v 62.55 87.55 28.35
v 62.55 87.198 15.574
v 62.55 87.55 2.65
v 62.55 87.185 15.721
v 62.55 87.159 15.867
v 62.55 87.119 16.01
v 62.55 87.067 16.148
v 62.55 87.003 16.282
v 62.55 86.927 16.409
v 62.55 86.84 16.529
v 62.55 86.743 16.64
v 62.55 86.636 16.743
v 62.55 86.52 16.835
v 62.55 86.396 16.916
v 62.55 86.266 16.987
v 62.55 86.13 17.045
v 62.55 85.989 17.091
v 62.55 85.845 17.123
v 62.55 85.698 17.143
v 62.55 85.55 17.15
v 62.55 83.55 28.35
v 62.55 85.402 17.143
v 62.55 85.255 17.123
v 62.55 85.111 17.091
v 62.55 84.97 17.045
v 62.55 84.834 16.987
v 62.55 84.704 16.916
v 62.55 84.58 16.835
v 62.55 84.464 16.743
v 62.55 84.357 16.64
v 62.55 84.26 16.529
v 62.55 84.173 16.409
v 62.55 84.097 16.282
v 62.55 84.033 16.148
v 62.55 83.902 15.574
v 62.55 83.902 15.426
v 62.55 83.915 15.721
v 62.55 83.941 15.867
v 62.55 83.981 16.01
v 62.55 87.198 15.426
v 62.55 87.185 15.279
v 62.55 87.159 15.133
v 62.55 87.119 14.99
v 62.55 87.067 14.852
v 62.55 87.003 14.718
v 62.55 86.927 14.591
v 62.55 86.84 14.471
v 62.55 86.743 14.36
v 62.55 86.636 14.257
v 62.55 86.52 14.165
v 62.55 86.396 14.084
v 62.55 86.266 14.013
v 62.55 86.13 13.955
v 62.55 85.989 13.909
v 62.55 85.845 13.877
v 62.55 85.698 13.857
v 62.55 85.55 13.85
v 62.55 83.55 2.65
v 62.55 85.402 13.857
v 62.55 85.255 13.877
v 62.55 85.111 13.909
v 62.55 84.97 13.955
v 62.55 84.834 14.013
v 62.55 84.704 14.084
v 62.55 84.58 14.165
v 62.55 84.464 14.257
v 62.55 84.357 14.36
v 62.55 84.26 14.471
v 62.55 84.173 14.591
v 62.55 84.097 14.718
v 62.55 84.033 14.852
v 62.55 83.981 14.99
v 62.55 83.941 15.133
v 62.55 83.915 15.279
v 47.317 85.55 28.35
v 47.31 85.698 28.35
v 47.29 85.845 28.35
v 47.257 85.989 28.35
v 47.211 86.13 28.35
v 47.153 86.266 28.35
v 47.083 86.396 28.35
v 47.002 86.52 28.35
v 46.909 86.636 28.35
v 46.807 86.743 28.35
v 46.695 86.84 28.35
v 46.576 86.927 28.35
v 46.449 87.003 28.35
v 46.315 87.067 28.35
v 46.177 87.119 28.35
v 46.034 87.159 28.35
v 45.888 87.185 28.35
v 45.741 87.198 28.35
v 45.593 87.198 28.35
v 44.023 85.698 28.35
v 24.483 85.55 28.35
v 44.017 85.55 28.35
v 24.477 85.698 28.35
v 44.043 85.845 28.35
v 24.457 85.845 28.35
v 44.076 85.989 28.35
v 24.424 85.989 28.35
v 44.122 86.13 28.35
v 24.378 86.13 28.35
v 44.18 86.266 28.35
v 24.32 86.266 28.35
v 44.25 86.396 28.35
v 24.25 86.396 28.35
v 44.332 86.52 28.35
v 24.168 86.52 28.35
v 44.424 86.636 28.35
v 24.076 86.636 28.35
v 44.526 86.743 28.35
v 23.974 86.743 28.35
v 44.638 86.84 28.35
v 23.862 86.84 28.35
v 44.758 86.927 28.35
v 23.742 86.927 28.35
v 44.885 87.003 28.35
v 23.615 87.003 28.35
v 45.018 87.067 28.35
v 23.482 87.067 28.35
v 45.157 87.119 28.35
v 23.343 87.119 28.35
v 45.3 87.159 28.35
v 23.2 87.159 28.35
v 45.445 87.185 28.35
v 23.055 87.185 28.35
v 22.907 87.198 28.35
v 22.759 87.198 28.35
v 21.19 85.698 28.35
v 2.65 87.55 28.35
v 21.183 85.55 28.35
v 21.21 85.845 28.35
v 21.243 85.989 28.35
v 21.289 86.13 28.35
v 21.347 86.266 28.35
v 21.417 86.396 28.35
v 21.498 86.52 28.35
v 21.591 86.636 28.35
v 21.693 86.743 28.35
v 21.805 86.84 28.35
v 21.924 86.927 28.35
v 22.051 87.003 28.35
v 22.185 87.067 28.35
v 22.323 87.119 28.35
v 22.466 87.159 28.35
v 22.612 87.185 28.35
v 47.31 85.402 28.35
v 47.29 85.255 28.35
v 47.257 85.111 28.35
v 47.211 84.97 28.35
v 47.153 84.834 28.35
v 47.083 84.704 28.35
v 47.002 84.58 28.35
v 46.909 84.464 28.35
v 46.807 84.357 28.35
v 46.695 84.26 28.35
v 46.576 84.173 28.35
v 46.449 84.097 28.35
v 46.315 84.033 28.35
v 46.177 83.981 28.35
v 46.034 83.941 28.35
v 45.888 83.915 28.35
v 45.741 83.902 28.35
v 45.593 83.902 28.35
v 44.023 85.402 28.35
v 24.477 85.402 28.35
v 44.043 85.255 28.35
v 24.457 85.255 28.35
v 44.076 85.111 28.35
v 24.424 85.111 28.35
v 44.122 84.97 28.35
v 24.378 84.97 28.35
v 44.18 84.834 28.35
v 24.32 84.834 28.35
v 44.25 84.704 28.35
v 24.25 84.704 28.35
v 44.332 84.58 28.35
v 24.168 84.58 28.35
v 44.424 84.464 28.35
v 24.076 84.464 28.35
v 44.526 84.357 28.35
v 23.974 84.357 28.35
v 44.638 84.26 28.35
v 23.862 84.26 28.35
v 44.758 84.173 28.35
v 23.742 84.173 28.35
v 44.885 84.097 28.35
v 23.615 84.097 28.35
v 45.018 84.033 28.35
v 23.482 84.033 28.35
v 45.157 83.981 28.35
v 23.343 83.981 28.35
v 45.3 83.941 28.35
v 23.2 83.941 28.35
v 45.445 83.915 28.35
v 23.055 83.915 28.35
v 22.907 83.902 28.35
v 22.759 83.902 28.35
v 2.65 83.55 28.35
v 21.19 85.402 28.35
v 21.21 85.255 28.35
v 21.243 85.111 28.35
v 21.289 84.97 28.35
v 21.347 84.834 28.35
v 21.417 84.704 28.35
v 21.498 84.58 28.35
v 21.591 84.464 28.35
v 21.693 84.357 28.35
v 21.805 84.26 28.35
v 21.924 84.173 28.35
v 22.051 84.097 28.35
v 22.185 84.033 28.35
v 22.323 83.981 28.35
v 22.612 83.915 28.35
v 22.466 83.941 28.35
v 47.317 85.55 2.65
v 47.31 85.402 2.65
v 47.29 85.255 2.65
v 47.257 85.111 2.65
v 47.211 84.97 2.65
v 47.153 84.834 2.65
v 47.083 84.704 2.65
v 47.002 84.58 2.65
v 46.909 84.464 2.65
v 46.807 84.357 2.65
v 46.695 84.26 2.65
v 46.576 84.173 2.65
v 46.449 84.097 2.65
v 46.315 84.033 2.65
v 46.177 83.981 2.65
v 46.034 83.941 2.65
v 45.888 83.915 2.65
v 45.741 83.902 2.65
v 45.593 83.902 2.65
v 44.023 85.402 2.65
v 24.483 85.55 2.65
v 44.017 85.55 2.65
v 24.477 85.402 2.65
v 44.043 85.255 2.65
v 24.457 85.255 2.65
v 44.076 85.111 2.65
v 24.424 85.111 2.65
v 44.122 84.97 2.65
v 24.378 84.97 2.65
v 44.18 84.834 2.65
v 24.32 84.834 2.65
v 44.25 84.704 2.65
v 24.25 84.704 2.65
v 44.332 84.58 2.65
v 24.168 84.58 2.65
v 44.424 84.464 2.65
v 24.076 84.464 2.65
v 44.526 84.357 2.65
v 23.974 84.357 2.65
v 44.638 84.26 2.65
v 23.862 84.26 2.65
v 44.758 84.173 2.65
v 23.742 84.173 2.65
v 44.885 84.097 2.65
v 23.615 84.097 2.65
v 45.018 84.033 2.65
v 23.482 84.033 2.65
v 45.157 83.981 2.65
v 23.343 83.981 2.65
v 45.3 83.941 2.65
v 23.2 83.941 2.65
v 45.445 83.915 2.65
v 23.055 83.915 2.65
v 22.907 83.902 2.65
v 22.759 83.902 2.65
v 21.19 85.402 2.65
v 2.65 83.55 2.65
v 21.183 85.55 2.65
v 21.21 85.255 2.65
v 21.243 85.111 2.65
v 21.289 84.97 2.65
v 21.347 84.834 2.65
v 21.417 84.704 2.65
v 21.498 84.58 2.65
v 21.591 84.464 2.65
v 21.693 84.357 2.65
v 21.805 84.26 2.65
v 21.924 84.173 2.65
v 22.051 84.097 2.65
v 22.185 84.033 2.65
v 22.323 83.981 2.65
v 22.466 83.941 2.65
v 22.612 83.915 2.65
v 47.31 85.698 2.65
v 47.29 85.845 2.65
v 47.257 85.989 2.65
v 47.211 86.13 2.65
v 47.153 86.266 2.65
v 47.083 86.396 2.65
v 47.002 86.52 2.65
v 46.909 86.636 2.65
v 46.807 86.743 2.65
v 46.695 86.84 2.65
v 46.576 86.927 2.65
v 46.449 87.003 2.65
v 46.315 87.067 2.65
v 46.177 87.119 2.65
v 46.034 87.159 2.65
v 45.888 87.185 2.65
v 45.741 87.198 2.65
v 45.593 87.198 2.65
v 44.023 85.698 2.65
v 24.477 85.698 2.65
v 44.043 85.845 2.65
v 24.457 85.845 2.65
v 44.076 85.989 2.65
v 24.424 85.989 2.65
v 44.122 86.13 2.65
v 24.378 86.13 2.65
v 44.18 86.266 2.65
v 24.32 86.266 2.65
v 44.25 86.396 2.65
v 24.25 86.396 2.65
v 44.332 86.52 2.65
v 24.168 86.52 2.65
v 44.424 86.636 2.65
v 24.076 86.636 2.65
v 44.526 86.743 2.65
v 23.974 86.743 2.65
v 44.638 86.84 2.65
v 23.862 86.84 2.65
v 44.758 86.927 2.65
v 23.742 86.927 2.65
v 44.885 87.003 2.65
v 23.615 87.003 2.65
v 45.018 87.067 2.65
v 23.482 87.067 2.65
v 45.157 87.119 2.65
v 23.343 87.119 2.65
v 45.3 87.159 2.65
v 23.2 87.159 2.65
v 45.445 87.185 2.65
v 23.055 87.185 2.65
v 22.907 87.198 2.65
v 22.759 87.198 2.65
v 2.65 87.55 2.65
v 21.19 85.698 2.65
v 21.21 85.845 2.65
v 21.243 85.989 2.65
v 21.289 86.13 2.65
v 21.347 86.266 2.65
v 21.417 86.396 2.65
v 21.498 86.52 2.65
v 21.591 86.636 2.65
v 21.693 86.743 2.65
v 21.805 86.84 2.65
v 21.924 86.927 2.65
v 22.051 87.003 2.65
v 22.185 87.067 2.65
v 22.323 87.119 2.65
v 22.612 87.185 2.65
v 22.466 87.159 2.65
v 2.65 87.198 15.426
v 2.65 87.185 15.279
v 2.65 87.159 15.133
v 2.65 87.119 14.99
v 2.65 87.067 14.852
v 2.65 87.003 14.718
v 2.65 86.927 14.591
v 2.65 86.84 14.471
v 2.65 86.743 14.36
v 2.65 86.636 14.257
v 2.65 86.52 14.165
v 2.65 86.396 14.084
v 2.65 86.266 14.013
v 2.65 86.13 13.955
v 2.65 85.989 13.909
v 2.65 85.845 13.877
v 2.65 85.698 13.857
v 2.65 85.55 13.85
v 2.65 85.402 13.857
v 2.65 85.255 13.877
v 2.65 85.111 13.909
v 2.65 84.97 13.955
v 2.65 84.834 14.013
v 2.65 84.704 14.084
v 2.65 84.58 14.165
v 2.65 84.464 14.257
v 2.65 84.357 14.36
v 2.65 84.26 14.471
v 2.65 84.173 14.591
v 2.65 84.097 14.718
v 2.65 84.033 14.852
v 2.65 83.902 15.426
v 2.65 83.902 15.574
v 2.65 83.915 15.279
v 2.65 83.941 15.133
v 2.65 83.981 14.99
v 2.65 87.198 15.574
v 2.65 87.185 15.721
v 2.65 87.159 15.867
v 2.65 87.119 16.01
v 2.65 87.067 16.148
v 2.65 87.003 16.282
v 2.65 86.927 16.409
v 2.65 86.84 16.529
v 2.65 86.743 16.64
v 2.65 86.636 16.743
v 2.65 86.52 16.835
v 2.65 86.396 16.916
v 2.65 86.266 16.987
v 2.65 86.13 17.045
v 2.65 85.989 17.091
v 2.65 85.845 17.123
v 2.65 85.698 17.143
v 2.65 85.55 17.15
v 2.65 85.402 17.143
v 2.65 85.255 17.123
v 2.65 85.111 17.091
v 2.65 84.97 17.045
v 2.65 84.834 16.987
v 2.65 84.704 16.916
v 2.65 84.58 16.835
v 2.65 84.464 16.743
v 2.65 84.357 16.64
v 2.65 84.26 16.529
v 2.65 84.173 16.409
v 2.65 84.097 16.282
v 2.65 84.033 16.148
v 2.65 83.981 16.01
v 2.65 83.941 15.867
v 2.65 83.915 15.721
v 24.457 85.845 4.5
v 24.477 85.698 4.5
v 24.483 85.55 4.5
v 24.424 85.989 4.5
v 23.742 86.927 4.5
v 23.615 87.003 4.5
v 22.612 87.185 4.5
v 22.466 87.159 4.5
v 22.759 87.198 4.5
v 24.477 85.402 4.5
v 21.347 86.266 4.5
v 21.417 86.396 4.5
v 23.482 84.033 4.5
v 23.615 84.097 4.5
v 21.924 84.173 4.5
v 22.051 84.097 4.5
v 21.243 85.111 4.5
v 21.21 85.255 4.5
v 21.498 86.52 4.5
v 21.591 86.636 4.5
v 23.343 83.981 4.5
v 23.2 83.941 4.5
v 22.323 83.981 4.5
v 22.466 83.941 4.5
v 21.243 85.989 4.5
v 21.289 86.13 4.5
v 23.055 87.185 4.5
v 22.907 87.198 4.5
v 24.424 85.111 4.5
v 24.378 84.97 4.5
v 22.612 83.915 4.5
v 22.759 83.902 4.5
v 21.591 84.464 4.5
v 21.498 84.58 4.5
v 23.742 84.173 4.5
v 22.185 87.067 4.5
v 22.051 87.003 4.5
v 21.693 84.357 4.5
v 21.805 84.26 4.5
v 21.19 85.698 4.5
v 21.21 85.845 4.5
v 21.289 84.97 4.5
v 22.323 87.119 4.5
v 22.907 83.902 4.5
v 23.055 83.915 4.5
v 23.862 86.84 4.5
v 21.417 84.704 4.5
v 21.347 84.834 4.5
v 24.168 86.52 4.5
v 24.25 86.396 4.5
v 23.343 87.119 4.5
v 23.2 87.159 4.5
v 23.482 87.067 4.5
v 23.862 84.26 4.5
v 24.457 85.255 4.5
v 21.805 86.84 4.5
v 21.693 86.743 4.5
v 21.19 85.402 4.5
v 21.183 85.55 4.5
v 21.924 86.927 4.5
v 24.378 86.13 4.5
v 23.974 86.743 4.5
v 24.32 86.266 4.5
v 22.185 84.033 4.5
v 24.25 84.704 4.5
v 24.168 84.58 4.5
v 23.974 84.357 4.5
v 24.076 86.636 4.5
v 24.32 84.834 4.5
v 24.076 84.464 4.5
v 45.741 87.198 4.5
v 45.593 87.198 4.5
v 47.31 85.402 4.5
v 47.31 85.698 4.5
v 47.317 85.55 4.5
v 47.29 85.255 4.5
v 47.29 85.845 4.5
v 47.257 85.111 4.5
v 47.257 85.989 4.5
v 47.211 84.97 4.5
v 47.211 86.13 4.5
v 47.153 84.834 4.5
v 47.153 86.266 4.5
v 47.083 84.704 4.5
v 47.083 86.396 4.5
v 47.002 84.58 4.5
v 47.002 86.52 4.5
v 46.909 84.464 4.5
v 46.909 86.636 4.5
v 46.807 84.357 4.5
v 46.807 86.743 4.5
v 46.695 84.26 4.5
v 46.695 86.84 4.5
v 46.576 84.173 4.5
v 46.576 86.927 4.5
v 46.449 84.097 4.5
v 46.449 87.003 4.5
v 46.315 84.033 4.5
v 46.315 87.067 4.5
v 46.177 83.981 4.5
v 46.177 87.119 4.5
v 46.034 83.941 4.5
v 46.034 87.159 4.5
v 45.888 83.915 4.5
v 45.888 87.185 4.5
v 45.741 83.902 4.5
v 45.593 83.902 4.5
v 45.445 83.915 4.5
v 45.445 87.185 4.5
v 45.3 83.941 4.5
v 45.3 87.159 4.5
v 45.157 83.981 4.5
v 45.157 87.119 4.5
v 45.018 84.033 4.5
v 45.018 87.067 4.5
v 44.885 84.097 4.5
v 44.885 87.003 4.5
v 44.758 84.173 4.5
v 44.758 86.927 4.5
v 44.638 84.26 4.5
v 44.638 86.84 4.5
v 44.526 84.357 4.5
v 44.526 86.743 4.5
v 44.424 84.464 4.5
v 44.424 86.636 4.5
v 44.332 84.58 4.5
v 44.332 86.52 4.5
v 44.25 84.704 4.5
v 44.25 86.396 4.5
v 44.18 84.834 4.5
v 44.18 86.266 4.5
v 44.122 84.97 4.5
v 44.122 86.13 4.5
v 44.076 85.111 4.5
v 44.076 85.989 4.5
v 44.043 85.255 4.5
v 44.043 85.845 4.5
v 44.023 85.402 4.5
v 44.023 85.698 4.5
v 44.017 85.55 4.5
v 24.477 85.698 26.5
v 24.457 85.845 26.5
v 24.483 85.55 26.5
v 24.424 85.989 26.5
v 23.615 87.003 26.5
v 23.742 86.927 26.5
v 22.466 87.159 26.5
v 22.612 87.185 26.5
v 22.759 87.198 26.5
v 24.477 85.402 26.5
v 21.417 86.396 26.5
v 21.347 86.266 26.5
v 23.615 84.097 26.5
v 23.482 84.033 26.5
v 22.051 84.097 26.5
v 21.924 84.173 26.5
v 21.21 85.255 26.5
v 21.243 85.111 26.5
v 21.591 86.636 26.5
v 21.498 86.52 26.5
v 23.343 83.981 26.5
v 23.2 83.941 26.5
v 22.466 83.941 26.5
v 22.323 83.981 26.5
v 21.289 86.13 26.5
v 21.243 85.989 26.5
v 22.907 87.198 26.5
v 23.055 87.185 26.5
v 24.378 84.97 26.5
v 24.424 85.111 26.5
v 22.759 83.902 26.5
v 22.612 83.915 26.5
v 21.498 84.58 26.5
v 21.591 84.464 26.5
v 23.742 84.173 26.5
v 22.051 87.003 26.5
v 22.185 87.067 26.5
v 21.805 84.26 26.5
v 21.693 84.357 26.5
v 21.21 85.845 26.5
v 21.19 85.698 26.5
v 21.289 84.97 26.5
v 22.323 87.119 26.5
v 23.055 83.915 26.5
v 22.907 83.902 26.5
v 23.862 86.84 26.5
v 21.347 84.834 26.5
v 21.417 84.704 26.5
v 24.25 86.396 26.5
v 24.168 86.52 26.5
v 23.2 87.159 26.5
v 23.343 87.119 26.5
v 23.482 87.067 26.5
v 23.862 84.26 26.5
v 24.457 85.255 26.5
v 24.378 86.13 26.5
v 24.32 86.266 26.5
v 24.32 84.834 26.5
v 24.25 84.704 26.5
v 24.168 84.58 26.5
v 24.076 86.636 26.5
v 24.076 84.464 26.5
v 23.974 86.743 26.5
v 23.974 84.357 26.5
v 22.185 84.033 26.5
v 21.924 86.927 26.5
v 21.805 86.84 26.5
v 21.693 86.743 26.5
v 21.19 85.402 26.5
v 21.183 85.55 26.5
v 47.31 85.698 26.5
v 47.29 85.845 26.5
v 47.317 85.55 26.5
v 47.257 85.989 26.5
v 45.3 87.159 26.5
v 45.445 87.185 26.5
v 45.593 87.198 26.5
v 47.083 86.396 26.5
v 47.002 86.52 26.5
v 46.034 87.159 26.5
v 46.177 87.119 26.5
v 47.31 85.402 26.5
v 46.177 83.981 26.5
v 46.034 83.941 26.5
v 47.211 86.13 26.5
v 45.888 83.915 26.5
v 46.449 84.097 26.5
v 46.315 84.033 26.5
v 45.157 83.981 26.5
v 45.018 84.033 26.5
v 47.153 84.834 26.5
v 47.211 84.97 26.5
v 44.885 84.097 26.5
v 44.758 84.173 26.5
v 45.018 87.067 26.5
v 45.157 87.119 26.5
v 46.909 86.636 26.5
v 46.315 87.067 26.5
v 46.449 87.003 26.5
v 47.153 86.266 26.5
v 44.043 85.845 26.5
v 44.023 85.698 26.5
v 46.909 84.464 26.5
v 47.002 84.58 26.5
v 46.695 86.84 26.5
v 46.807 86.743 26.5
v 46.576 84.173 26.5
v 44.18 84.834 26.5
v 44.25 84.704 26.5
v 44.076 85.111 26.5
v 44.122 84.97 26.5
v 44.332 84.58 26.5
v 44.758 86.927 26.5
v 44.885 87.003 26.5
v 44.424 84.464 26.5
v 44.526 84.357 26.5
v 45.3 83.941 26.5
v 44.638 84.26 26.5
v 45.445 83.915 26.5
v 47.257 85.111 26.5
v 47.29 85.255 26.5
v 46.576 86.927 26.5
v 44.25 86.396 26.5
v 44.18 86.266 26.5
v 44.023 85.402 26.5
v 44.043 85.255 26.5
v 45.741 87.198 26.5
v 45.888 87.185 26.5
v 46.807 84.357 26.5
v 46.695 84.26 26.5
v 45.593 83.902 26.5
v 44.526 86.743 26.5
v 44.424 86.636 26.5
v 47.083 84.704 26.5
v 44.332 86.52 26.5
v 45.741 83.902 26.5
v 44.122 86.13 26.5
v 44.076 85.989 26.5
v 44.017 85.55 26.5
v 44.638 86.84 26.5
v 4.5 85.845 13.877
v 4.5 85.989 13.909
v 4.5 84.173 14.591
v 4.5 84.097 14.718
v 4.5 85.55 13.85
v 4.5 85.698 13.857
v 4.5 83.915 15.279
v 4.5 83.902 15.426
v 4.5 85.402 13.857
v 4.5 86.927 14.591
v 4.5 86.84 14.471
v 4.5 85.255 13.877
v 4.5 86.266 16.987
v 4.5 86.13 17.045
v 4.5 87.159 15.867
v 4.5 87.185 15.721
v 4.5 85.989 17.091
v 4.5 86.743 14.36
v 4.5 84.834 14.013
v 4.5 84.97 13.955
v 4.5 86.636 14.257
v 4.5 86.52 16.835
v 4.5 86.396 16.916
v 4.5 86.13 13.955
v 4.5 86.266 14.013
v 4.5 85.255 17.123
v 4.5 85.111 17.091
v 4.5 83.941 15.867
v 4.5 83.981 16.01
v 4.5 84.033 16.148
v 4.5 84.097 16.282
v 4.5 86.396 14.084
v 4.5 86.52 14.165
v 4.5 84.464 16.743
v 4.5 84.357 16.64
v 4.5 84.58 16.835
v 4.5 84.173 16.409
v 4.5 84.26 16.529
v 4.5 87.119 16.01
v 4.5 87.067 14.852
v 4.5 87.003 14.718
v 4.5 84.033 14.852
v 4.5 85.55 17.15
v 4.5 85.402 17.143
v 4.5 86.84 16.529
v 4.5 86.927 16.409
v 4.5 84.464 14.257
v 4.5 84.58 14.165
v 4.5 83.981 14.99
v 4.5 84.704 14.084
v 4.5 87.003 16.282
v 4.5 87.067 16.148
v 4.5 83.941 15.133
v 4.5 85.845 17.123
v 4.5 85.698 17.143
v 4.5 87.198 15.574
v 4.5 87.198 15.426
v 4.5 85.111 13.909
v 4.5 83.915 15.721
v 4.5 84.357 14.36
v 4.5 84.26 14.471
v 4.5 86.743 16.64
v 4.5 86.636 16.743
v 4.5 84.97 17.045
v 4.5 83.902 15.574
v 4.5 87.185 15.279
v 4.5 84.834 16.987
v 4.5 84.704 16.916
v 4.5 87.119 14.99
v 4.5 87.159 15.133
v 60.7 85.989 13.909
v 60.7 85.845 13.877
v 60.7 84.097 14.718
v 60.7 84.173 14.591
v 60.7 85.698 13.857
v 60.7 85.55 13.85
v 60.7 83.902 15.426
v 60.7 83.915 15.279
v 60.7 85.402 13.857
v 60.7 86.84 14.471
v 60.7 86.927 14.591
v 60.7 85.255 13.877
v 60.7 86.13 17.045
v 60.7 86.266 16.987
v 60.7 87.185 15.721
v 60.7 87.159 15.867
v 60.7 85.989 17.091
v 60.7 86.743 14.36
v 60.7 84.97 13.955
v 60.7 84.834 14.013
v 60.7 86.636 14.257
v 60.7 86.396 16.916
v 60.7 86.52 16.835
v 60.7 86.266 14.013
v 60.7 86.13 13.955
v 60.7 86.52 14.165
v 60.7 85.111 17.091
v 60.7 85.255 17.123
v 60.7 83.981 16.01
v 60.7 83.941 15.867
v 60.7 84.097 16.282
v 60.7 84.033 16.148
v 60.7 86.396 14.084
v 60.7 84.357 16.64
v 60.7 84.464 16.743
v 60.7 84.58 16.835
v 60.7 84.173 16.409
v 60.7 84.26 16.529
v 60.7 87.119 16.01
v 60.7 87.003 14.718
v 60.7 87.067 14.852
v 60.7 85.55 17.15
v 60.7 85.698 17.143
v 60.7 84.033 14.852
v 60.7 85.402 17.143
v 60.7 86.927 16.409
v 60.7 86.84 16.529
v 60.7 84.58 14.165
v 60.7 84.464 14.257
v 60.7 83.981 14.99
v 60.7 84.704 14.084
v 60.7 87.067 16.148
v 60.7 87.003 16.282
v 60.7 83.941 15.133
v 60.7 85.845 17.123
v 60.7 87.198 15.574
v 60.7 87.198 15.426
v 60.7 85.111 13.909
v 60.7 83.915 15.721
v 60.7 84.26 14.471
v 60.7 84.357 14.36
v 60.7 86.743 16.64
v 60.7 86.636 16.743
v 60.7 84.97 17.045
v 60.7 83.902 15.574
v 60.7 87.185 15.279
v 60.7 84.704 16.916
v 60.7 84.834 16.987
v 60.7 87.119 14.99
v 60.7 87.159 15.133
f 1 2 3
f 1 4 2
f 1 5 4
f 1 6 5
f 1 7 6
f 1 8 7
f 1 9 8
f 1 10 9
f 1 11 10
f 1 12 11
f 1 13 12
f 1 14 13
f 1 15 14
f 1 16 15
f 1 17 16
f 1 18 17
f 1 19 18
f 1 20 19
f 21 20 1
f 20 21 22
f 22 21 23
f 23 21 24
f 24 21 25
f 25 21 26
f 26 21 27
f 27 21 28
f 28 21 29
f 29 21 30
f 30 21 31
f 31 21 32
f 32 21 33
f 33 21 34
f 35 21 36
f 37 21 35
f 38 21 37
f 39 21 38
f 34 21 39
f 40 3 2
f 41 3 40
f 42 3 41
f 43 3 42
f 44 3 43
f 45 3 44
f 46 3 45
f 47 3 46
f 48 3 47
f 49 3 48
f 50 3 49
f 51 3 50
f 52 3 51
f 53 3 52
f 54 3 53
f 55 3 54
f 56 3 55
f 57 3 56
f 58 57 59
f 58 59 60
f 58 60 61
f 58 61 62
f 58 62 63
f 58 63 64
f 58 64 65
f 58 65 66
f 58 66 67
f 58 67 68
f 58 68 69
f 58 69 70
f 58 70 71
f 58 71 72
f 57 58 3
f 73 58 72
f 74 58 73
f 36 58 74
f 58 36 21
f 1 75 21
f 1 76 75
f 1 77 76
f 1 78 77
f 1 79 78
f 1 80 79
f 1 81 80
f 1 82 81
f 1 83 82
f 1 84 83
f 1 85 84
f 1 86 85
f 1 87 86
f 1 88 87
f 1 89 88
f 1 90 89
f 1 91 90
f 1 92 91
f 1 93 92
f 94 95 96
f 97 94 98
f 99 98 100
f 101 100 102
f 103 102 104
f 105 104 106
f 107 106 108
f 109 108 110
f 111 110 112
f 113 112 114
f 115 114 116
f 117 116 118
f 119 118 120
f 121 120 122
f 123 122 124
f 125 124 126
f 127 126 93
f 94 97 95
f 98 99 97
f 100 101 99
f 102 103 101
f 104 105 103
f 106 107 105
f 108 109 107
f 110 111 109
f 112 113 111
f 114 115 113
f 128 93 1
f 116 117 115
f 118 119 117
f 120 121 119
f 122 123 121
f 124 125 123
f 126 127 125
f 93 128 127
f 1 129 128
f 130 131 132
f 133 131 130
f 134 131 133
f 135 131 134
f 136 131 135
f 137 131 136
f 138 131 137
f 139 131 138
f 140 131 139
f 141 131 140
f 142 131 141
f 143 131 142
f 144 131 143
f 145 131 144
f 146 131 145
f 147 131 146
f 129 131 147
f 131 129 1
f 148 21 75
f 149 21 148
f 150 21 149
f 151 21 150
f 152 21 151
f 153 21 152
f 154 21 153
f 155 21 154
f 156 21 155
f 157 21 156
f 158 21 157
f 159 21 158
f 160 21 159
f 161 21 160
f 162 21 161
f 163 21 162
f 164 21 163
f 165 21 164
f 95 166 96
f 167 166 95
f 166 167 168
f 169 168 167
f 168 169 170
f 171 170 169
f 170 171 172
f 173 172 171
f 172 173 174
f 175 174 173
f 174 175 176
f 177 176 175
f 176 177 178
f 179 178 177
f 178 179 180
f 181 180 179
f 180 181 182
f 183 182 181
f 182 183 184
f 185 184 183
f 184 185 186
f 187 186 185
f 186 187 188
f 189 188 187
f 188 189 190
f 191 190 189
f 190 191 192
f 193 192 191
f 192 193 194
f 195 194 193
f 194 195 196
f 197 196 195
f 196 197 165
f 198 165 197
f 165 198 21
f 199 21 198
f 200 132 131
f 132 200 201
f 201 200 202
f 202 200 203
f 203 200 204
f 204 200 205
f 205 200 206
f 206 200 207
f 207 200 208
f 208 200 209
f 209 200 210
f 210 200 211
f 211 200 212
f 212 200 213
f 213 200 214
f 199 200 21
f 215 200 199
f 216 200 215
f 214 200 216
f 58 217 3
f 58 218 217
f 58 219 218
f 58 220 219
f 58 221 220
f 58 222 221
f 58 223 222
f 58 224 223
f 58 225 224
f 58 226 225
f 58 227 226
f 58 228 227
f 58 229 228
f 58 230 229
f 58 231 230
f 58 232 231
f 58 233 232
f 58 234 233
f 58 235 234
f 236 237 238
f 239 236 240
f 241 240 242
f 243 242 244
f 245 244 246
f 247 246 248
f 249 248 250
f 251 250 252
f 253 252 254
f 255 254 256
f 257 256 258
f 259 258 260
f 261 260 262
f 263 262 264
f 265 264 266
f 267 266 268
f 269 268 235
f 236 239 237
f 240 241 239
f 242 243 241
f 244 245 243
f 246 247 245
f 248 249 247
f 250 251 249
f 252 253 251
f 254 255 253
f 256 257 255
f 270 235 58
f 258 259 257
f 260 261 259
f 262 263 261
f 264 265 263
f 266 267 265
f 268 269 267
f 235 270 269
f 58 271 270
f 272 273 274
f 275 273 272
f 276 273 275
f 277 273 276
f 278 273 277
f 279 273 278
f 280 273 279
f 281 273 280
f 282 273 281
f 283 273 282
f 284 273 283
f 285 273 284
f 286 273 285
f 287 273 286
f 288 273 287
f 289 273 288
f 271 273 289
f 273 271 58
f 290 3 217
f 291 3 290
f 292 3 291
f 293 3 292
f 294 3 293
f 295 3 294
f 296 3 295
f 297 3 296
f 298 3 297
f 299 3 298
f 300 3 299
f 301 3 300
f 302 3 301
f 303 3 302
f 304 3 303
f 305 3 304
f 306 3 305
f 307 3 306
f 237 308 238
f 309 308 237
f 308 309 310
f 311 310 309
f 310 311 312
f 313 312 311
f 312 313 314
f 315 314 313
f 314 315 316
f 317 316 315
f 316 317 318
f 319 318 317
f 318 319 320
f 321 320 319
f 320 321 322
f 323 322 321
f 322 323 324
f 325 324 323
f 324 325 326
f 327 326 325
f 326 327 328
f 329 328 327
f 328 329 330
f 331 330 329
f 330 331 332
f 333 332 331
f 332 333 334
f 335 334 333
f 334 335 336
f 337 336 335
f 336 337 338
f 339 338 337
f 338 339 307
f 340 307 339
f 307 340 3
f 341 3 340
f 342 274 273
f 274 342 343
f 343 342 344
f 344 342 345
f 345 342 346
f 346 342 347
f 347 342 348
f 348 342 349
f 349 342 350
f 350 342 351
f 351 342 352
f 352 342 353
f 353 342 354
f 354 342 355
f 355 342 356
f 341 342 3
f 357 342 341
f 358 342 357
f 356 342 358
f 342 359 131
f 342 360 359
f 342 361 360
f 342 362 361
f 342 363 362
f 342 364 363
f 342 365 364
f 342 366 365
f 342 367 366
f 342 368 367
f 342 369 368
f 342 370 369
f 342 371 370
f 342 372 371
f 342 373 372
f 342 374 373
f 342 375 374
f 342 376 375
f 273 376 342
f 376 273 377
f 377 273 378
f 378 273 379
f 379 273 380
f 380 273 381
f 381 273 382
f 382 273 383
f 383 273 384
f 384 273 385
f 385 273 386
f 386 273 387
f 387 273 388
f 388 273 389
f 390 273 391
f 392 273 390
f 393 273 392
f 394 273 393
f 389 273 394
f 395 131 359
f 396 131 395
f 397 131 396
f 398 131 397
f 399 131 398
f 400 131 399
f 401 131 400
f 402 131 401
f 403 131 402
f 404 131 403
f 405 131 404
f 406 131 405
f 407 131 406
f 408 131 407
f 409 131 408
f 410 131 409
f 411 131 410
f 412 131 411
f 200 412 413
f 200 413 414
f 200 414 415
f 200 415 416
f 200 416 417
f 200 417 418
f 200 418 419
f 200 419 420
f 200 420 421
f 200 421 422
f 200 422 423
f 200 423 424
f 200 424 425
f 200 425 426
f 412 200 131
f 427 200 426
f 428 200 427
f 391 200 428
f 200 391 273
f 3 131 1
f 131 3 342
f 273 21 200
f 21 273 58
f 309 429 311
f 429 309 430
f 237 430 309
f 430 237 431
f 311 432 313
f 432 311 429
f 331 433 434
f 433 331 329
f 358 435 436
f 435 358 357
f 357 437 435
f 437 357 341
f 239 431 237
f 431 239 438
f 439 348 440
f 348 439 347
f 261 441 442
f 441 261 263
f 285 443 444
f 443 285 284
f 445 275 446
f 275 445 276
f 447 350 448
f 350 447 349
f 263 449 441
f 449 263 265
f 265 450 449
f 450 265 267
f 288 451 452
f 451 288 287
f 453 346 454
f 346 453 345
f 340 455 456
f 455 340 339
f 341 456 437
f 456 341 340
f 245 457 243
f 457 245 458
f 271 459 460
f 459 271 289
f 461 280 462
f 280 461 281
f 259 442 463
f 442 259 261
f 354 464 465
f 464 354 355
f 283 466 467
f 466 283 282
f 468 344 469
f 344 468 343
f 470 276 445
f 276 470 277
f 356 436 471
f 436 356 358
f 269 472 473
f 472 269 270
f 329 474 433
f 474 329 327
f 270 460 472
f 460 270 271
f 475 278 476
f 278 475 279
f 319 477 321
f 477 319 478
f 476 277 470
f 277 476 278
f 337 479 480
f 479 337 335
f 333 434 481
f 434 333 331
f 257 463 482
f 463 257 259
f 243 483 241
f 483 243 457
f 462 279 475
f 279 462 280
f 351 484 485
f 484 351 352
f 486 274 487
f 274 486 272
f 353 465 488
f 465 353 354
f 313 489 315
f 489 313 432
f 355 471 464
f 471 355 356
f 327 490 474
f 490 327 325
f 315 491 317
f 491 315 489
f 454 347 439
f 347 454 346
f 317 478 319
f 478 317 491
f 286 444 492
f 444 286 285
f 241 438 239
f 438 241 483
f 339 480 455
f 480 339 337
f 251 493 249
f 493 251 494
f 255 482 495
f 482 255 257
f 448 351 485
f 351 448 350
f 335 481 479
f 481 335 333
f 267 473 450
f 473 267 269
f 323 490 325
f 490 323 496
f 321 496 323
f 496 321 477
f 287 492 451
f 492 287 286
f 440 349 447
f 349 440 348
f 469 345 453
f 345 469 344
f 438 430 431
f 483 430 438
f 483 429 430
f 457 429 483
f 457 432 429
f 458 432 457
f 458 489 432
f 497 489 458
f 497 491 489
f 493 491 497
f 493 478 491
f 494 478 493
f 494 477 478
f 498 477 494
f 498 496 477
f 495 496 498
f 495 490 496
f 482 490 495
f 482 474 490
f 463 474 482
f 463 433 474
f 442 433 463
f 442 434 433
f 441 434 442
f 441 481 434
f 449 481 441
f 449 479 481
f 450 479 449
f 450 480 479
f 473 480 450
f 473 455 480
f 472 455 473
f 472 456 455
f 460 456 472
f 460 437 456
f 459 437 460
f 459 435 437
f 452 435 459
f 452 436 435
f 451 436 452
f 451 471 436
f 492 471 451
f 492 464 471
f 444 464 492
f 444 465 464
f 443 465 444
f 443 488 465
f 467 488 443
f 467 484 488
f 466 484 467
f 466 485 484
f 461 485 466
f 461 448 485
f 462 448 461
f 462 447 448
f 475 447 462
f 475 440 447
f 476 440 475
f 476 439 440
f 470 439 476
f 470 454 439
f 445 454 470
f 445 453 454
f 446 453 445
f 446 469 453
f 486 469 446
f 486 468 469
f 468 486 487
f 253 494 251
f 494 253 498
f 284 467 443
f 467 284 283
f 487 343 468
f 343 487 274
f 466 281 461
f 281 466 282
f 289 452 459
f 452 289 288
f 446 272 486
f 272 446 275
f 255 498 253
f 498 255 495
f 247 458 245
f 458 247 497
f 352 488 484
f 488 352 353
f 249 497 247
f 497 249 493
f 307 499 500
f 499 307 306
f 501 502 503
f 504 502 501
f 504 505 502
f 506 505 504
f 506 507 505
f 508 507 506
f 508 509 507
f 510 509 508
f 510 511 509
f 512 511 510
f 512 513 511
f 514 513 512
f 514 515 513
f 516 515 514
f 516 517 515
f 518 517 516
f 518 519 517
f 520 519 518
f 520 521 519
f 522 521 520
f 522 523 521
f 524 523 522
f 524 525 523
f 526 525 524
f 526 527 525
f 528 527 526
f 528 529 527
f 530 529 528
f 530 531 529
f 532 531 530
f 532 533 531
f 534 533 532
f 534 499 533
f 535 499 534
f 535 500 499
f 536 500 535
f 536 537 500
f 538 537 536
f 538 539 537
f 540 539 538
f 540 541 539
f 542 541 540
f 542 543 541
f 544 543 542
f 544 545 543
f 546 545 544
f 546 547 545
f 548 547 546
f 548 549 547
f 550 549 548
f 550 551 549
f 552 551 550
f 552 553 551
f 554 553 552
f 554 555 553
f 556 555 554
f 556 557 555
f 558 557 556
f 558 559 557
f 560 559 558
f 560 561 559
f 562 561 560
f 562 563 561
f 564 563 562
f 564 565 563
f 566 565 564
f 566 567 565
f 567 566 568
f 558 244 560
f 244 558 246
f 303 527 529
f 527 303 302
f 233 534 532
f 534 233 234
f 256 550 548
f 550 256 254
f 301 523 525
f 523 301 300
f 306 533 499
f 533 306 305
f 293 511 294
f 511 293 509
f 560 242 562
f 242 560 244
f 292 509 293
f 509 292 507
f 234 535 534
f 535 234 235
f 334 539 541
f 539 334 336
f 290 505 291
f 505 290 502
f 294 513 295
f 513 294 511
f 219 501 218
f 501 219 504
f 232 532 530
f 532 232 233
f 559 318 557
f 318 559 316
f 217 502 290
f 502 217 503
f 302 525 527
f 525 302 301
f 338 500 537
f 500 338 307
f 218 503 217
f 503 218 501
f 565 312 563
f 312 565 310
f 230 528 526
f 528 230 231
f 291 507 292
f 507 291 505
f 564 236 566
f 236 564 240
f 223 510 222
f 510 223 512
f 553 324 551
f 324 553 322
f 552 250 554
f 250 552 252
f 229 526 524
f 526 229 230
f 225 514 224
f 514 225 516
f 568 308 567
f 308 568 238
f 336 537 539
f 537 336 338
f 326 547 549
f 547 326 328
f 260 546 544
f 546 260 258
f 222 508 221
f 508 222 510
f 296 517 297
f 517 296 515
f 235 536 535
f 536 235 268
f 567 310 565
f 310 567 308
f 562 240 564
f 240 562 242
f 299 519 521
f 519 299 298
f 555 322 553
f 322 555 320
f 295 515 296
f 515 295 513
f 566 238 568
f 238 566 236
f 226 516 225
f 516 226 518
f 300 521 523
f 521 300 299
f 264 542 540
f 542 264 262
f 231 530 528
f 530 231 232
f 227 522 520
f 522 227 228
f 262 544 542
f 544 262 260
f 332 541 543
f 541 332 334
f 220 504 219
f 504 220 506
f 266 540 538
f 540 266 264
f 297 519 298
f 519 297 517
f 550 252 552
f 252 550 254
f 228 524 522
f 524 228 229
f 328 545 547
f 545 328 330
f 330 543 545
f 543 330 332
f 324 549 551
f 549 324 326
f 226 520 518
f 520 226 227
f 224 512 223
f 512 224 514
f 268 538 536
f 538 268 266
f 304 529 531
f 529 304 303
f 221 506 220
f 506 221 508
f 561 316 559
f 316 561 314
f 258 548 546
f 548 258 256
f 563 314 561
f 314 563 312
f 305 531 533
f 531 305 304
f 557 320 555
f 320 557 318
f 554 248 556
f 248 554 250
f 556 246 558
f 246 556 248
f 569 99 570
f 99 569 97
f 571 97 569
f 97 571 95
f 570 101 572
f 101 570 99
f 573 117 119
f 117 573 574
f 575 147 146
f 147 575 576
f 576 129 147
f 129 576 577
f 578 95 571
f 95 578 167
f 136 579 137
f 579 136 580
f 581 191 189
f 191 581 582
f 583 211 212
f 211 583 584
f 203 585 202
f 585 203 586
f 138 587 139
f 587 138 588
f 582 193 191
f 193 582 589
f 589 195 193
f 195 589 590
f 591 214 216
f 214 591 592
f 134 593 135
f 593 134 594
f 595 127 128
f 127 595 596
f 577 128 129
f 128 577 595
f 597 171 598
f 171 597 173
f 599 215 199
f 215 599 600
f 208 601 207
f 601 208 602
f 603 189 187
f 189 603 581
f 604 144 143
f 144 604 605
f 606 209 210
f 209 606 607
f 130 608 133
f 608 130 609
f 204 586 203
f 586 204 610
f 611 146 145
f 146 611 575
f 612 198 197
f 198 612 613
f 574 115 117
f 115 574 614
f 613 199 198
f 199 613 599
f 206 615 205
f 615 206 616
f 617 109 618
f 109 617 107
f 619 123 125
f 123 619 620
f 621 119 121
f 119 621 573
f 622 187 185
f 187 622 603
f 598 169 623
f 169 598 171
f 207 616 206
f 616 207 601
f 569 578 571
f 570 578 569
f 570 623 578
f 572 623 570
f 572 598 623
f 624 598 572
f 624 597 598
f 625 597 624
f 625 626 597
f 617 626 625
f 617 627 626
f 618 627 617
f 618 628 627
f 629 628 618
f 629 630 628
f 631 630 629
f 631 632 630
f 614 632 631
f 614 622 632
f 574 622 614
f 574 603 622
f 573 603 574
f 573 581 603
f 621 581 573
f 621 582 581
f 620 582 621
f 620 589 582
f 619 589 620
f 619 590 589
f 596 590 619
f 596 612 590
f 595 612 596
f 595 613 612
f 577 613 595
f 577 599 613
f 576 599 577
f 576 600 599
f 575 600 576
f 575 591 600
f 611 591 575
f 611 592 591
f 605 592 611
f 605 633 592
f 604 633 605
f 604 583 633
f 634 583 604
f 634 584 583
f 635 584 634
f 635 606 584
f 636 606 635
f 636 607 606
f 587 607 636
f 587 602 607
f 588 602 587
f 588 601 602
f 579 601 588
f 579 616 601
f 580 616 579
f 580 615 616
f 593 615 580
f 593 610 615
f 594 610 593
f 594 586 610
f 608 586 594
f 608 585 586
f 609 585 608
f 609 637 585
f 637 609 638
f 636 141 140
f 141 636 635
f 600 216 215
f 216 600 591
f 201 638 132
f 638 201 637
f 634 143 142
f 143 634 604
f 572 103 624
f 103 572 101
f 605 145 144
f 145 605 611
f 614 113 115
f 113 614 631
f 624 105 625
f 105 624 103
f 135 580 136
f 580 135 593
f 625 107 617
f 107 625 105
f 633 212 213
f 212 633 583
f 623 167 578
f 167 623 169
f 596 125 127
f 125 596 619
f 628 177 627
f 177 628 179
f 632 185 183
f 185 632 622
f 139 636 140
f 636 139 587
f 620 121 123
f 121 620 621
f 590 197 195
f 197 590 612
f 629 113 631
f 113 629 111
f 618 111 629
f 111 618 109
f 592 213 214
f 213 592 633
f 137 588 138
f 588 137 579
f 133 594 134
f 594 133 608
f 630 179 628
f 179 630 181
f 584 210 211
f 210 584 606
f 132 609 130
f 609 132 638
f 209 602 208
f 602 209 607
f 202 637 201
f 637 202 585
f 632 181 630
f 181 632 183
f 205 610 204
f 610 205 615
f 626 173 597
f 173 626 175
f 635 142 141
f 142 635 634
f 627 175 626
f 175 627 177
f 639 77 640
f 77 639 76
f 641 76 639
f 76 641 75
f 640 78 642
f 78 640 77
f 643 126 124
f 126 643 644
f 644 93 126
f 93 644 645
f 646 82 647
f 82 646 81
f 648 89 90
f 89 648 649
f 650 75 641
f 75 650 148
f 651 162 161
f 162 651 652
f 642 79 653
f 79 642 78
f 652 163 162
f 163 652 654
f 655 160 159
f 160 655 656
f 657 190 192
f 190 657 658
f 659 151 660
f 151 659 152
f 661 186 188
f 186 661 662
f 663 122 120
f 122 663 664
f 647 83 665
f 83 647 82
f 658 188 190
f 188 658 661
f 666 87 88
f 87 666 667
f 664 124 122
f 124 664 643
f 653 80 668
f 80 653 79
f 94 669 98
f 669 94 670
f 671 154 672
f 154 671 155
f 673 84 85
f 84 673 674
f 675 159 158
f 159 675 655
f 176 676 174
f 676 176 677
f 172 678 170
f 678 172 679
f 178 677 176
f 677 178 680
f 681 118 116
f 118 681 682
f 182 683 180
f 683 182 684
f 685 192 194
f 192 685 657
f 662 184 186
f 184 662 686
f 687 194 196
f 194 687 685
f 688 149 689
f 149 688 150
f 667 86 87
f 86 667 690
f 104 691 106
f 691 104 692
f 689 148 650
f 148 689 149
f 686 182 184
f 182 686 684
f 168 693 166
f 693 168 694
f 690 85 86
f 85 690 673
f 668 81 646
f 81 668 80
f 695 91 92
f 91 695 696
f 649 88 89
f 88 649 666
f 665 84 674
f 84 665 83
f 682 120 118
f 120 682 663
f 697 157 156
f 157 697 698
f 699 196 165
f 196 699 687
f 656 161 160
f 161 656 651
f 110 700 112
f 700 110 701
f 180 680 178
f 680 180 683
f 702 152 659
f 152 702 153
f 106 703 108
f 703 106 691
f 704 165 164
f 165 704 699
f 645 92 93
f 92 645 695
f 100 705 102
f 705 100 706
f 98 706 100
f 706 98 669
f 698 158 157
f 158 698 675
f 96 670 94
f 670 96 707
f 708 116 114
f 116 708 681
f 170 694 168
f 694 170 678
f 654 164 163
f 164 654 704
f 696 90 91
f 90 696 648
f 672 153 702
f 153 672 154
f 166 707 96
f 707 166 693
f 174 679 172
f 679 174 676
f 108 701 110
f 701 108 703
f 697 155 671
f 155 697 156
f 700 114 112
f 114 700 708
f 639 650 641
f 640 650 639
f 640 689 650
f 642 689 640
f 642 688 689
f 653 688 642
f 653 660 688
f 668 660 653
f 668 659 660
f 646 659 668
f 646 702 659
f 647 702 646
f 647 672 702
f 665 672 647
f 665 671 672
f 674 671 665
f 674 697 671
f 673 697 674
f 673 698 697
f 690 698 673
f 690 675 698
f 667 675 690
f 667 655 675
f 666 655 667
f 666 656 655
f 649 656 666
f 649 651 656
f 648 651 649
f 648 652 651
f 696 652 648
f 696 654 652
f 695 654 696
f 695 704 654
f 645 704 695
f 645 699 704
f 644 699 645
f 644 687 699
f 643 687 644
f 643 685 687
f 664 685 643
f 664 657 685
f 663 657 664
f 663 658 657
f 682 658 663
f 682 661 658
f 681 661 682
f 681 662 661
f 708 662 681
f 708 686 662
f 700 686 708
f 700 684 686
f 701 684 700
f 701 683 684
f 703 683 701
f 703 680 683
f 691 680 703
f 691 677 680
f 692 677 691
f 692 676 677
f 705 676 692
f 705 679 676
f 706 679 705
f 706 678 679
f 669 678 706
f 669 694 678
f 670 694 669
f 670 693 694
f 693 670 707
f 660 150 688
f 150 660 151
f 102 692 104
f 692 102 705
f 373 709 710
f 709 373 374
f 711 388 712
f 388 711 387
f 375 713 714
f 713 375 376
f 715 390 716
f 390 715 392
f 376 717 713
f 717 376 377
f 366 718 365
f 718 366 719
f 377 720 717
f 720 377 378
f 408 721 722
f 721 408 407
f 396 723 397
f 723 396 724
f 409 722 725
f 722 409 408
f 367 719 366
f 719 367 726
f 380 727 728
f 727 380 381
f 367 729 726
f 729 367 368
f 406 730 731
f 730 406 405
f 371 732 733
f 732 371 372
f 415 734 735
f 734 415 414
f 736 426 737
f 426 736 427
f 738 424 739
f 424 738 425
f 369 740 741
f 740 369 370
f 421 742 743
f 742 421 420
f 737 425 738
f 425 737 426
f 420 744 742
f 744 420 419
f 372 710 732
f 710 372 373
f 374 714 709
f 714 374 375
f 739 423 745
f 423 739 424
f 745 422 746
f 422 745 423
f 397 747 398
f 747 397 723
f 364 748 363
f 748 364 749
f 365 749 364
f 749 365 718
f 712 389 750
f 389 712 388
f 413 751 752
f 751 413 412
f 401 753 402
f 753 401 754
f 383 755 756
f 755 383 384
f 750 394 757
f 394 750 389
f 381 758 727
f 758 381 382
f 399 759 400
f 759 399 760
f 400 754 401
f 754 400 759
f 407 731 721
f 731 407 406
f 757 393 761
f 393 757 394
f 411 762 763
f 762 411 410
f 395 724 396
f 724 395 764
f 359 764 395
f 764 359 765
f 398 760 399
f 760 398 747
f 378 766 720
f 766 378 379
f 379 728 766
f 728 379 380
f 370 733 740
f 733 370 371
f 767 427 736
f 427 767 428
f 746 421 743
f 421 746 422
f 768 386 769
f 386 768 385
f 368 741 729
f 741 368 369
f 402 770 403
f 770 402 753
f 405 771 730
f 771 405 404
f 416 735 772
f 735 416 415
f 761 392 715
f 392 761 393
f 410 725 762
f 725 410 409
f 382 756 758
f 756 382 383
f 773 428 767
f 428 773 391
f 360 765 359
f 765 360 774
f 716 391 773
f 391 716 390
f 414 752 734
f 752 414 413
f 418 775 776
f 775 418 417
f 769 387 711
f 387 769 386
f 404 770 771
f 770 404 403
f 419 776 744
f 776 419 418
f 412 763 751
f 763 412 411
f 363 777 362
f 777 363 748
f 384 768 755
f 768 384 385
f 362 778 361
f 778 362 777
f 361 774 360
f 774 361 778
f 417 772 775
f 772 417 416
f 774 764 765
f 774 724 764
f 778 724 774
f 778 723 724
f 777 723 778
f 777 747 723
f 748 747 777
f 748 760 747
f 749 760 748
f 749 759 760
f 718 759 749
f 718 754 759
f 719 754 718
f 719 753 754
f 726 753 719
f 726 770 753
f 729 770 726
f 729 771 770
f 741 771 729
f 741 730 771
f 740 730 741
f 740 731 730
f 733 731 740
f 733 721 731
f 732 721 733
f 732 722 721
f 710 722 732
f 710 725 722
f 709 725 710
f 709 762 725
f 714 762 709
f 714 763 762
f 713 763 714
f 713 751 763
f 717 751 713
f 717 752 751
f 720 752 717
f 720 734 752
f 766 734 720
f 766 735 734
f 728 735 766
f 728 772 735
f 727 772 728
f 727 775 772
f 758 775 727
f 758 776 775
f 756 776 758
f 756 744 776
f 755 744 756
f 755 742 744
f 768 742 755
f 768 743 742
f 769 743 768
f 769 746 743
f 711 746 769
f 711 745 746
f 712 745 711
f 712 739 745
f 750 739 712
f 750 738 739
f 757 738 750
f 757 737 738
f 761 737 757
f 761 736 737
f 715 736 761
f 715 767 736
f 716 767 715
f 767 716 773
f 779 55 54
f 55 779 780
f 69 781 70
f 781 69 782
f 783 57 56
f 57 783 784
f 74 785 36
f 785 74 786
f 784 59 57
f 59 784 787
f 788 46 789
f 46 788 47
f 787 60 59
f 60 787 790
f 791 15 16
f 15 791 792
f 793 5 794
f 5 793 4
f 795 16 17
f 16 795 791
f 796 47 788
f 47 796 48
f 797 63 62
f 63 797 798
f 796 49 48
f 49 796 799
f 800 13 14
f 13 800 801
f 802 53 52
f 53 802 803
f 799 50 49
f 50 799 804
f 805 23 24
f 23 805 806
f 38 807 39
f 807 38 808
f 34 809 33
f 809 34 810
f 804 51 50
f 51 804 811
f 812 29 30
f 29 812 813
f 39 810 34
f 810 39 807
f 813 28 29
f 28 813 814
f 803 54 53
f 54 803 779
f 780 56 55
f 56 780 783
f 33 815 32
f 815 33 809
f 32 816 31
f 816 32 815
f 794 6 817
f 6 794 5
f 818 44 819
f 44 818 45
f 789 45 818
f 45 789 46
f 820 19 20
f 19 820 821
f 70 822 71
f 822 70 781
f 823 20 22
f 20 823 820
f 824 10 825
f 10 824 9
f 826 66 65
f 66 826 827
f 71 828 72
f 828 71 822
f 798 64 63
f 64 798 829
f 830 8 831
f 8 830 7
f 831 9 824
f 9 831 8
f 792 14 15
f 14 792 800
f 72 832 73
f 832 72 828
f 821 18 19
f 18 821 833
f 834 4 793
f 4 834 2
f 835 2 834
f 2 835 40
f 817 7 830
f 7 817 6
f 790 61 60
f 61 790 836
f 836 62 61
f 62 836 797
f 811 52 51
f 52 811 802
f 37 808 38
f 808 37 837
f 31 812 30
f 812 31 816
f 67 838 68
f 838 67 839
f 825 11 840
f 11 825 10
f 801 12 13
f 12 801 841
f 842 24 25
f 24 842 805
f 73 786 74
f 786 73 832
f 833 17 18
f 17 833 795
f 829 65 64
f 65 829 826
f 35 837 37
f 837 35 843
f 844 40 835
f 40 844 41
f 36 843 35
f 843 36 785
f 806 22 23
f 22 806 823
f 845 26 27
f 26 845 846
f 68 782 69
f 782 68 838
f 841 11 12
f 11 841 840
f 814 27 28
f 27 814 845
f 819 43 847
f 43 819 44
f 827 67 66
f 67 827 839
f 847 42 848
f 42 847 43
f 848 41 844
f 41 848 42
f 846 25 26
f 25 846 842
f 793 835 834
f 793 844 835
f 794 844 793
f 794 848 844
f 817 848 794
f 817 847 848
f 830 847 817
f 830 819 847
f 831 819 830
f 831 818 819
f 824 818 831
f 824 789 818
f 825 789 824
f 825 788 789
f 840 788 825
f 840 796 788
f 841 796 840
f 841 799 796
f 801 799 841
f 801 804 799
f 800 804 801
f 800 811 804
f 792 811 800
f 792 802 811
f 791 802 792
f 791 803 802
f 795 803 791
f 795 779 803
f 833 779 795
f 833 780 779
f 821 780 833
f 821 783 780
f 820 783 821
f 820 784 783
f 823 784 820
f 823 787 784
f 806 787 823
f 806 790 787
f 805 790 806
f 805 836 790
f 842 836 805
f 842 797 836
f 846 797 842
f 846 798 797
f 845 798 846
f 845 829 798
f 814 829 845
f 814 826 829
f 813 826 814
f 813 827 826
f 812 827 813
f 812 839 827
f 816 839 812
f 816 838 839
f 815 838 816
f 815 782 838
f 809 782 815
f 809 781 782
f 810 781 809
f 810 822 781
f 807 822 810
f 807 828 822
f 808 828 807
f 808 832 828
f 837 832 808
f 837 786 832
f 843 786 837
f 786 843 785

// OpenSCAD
// file: ../mcad/boxes.scad
$fn=50;

scale([4.2, 4.2, 4.2]) {
    color("#1a1203") {
        difference() {
            cube([12, 12, 18]);
            #translate([1, 1, 1.5]) cube([10, 10, 18]);
            translate([-0.3, 0, 14]) { 
                #rotate([0, 0, -45]) cube([0.3, 20, 4]);
            }
            
            translate([12, -0.2, 14]) { 
                #rotate([0, 0, 45]) cube([0.3, 20, 4]);
            }
        }
    };
/*
    translate([40, 0, 0]) {
        color("silver") {
            cube([10, 14, 18]);
        };
    }

    translate([0, -40, 0]) {
        color("#414240")
        cube([10, 14, 11]);
    }
    translate([ 40, -40, 0]) {
        color("gray")
        cube([12, 10, 12]);
    }

    translate([ 20, -20, 0]) {
        color("#90664b")
        cube([ 13.5, 8, 17]);
    }
*/
}
// main file
use <../mcad/boxes.scad>;

$fa = 1;
$fs = 0.15;

x = 60.2;
y = 78.2+5.5;
z = 26;

w = 2.5;
r = 2.5;

mag_d = 3.3;
mag_h = 2;

module case() {
  difference() {
    roundedCube([x+w+r, y+w+r, z+w+r], r = r);
    translate([w, w, w])
    cube([x, y+10, z]);
    
    translate([(mag_d+x+w+r)/3, -mag_d/2+y+w+r-1.5, w-mag_h])
    cylinder(h = mag_h, d = mag_d);
    
    translate([(mag_d+x+w+r)/3*2, -mag_d/2+y+w+r-1.5, w-mag_h])
    cylinder(h = mag_h, d = mag_d);

    translate([(mag_d+x+w+r)/3, -mag_d/2+y+w+r-1.5, w-mag_h+z+mag_h])
    cylinder(h = mag_h, d = mag_d);
    
    translate([(mag_d+x+w+r)/3*2, -mag_d/2+y+w+r-1.5, w-mag_h+z+mag_h])
    cylinder(h = mag_h, d = mag_d);

    translate([w-mag_h, -mag_d/2+y+w+r-1.5, z/2+w])
    rotate([0, 90, 0])
    cylinder(h = mag_h, d = mag_d);
    
    translate([x+w, -mag_d/2+y+w+r-1.5, z/2+w])
    rotate([0, 90, 0])
    cylinder(h = mag_h, d = mag_d);
  }
}

module lid() {
  difference() {
    translate([w+0.15, y-0.15, w+0.15])
    #cube([x-0.3, 4, z-0.3]);

    translate([(mag_d+x+w+r)/3, -mag_d/2+y+w+r-1.5, w])
    cylinder(h = mag_h, d = mag_d);

    translate([(mag_d+x+w+r)/3*2, -mag_d/2+y+w+r-1.5, w])
    cylinder(h = mag_h, d = mag_d);

    translate([(mag_d+x+w+r)/3, -mag_d/2+y+w+r-1.5, w-mag_h+z])
    cylinder(h = mag_h, d = mag_d);

    translate([(mag_d+x+w+r)/3*2, -mag_d/2+y+w+r-1.5, w-mag_h+z])
    cylinder(h = mag_h, d = mag_d);

    translate([w, -mag_d/2+y+w+r-1.5, z/2+w])
    rotate([0, 90, 0])
    cylinder(h = mag_h, d = mag_d);

    translate([x+w-mag_h, -mag_d/2+y+w+r-1.5, z/2+w])
    rotate([0, 90, 0])
    cylinder(h = mag_h, d = mag_d);
  }
}

lid();
